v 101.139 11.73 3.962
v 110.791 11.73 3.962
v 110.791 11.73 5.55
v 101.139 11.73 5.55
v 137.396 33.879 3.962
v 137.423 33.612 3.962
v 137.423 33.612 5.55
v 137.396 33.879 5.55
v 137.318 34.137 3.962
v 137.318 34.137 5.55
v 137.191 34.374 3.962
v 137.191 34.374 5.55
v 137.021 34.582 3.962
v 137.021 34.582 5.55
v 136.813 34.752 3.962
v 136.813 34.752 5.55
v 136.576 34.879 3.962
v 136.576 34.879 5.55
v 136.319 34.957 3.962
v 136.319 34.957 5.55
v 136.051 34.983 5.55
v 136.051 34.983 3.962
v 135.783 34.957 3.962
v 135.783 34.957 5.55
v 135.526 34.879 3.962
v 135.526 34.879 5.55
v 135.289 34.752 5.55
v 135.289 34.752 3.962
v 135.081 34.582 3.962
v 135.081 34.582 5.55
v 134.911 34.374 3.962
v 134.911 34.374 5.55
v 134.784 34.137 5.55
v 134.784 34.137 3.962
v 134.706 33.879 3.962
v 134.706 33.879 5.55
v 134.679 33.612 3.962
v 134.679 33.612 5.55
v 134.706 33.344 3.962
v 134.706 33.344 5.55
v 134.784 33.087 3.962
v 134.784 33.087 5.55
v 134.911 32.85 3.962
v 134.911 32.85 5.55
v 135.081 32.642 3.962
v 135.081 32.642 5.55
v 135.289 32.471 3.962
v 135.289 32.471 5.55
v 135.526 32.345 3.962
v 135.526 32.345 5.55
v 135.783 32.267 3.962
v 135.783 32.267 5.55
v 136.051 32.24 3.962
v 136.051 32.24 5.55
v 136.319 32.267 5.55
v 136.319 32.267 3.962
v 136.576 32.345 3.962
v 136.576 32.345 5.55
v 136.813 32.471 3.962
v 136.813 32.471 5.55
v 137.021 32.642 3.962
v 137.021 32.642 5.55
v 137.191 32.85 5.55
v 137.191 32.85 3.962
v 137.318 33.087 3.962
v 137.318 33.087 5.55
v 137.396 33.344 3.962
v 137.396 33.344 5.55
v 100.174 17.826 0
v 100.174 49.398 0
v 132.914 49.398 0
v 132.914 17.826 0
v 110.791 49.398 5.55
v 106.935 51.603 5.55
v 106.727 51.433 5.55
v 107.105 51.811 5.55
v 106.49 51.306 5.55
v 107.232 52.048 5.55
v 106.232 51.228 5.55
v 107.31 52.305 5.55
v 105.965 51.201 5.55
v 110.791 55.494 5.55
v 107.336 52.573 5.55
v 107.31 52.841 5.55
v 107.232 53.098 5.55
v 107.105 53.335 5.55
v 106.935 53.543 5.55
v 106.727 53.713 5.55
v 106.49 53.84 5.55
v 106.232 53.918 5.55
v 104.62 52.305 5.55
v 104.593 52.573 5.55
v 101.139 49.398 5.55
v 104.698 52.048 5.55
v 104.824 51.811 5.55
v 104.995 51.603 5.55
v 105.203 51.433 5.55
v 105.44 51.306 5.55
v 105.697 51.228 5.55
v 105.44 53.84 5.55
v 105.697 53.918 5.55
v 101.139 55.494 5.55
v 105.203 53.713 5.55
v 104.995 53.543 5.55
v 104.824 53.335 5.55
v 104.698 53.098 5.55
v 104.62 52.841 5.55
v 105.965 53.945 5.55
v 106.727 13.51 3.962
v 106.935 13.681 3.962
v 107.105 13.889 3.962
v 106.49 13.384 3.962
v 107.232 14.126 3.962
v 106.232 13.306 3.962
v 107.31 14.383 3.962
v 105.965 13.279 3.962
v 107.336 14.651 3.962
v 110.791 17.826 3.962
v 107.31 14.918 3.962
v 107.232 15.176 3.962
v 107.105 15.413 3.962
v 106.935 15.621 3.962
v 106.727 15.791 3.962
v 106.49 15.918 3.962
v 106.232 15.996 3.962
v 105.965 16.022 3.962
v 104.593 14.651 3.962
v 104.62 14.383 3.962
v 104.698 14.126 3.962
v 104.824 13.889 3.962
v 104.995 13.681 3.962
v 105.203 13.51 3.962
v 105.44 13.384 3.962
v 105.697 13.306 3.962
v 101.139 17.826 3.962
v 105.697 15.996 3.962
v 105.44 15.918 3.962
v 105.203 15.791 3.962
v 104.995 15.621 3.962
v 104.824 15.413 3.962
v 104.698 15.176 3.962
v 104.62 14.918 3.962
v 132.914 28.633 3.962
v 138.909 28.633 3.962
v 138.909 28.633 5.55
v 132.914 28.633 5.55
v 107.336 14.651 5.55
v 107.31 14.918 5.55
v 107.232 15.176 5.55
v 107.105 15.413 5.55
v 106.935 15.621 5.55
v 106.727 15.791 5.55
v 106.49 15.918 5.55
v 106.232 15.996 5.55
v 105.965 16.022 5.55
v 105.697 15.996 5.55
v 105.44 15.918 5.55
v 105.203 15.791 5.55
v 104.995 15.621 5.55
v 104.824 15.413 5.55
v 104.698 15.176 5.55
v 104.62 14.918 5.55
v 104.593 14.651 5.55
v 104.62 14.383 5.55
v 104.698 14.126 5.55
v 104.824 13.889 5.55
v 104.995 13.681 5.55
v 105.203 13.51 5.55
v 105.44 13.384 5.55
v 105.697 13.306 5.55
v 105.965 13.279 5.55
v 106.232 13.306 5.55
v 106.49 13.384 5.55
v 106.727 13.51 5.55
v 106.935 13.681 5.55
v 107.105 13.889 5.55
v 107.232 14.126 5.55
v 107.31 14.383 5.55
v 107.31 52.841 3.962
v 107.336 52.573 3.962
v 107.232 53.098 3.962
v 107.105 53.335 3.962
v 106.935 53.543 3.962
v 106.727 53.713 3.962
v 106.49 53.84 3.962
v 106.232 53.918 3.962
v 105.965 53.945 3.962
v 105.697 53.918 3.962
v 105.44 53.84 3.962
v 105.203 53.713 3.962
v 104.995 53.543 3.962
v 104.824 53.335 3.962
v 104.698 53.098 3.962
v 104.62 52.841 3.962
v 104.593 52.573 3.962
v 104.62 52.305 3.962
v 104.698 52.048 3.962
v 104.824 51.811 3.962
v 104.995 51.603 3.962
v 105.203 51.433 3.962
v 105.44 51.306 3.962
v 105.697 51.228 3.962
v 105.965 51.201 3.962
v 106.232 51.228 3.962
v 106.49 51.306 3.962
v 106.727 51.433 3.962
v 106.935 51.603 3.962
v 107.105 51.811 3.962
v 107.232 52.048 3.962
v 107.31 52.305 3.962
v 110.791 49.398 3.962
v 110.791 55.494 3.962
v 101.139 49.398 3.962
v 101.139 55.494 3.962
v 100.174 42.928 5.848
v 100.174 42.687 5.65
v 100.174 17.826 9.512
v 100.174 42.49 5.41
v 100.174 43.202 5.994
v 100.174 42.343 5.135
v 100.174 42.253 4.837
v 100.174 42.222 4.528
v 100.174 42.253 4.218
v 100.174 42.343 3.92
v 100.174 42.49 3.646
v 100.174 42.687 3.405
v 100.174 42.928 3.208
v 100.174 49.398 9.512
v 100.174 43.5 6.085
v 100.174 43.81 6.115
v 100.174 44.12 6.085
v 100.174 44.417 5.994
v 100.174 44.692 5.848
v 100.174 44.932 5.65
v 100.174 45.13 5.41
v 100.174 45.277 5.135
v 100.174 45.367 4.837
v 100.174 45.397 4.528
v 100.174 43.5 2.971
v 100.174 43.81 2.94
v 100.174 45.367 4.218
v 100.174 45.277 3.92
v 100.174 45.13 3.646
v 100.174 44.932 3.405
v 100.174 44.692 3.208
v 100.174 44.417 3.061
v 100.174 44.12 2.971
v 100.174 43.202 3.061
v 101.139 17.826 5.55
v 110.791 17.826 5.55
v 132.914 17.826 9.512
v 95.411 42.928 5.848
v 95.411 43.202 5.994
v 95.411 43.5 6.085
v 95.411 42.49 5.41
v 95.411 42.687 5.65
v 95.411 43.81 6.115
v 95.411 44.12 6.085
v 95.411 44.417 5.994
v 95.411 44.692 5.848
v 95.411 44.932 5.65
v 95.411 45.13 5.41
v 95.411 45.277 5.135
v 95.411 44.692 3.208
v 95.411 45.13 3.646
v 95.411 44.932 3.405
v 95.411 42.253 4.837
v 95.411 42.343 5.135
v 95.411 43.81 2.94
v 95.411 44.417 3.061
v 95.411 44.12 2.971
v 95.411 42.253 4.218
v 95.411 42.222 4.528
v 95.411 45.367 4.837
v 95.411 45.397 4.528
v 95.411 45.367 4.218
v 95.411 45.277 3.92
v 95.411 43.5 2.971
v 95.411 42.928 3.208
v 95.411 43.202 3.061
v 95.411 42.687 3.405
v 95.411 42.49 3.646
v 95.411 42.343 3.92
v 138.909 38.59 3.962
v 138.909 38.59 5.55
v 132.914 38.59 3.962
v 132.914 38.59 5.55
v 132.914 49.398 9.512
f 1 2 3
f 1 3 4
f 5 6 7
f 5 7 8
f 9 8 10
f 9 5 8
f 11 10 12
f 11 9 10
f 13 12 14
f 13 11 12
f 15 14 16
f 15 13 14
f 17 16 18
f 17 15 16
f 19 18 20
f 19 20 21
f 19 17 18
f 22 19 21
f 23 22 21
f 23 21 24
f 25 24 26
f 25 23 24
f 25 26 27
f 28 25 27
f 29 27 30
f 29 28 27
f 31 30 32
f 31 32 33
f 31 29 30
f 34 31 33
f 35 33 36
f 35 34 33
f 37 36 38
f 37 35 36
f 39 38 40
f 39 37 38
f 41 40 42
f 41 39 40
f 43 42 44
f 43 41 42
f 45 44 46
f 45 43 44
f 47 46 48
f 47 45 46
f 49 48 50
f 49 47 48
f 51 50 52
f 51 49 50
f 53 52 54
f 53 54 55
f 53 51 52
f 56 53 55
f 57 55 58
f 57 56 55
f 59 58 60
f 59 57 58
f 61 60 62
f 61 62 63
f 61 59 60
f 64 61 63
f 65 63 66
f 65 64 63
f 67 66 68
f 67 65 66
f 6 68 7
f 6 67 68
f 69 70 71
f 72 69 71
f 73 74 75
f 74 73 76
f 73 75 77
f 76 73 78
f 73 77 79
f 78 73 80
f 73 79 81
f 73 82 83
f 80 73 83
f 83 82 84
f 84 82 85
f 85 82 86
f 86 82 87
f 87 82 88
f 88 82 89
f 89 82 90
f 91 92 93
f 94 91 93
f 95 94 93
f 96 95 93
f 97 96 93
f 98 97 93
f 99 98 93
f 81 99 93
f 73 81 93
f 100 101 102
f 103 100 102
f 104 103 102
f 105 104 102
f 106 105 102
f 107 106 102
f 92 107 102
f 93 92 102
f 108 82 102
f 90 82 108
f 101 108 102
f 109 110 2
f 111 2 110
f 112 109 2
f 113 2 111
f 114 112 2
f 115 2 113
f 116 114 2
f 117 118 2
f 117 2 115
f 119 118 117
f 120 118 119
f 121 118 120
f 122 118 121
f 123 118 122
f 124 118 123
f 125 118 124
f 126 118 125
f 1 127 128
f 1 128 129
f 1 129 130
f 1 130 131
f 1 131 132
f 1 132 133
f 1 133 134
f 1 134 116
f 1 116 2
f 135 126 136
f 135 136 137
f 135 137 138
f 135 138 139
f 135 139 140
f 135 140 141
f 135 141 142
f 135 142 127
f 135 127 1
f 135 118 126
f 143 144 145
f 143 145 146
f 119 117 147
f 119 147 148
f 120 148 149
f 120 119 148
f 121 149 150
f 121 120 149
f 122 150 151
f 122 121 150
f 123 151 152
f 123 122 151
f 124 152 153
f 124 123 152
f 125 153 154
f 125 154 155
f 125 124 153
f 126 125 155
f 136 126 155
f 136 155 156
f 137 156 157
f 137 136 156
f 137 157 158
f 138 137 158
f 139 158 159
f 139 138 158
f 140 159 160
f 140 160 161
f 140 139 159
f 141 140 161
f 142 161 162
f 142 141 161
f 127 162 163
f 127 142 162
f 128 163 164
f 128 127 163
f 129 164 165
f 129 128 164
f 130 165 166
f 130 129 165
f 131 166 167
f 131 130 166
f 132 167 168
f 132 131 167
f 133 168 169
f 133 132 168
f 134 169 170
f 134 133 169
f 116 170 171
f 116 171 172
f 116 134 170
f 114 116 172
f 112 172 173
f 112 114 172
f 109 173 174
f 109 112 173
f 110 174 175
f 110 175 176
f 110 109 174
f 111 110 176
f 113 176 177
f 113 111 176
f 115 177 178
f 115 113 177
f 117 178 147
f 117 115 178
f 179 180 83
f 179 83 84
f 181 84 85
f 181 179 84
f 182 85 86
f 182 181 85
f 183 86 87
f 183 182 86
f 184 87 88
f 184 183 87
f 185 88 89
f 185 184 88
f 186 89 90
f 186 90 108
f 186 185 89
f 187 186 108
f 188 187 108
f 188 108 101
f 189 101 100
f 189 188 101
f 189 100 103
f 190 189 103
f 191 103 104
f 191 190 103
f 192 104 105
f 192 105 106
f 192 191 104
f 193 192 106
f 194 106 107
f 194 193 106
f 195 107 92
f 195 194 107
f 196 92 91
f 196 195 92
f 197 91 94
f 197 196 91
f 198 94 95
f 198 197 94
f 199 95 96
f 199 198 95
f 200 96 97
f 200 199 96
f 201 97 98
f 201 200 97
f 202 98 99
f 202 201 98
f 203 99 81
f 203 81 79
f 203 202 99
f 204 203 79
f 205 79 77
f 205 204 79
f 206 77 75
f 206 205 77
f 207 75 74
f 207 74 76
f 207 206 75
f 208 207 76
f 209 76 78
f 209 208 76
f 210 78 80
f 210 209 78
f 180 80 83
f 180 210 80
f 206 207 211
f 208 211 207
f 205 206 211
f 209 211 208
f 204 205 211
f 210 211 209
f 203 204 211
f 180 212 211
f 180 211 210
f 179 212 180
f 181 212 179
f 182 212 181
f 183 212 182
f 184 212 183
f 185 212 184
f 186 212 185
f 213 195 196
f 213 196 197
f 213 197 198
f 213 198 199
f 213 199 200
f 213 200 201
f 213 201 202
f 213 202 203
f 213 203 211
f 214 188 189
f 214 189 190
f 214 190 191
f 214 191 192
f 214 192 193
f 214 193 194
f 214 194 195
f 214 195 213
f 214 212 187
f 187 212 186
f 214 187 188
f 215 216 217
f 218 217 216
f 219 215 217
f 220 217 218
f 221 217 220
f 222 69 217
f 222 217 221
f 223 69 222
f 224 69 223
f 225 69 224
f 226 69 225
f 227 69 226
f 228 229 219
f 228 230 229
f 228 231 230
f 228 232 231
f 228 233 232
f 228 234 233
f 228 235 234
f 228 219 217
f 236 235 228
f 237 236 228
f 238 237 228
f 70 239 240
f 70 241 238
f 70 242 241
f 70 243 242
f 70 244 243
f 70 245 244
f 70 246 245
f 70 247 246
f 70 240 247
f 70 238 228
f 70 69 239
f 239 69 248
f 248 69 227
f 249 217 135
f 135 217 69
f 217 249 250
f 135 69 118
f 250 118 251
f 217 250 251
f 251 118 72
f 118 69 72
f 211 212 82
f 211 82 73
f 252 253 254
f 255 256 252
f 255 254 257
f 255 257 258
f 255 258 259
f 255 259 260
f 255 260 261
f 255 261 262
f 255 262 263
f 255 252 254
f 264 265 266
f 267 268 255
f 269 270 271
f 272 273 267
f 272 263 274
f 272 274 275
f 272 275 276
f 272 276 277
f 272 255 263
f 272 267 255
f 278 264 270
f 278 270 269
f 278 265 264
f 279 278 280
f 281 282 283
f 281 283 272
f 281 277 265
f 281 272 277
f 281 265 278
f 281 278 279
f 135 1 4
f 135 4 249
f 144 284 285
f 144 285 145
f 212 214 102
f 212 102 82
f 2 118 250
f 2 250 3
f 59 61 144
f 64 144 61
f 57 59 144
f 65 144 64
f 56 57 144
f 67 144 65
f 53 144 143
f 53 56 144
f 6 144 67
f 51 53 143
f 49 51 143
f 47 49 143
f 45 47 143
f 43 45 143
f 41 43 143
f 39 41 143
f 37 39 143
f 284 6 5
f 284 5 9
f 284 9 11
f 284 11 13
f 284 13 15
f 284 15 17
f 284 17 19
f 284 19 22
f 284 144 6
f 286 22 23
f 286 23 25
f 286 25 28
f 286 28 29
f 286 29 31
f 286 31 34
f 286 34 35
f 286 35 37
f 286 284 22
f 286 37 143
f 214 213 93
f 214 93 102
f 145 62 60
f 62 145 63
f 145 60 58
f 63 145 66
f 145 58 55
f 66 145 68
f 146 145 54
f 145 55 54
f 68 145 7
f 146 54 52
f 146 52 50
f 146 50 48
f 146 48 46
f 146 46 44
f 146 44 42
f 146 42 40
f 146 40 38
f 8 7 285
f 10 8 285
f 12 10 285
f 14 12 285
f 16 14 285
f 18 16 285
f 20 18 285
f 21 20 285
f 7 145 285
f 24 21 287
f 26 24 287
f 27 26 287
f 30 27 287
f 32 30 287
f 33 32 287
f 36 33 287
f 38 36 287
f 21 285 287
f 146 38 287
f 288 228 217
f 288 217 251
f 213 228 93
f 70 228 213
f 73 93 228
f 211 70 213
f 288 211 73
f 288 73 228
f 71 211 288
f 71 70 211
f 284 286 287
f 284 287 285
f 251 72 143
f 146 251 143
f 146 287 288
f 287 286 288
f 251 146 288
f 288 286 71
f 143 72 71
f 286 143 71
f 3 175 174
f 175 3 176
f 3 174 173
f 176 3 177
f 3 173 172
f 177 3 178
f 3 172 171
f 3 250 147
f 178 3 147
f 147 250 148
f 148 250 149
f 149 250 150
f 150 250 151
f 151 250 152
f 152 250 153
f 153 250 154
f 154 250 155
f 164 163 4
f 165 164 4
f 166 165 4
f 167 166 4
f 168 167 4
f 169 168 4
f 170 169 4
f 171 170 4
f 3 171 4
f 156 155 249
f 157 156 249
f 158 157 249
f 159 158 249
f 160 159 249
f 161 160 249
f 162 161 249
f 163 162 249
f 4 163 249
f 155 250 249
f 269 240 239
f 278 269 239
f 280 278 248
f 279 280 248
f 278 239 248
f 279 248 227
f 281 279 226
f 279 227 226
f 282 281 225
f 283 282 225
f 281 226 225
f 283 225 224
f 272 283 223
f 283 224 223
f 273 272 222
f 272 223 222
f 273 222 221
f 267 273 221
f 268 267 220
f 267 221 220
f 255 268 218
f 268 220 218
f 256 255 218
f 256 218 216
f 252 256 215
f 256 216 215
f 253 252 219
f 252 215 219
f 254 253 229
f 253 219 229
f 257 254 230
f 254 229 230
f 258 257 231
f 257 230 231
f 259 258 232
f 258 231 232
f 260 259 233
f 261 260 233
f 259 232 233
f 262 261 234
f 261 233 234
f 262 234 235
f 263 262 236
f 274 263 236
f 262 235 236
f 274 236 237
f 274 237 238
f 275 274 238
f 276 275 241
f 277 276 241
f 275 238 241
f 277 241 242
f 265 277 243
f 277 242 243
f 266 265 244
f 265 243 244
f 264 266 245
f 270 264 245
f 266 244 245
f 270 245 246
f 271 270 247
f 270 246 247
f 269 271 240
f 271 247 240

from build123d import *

# Parameters (mm, degrees)
SKETCH1_W           = 32.7406
SKETCH1_H           = 31.5722
BOSS_EXTRUDE1_DEPTH = 3.9624
SKETCH2_R           = 1.3716
BOSS_EXTRUDE2_DEPTH = 1.5875
SKETCH3_W           = 32.7406
SKETCH3_H           = 31.5722
BOSS_EXTRUDE3_DEPTH = 3.9624
SKETCH4_R           = 1.5875
BOSS_EXTRUDE4_DEPTH = 4.7625


with BuildPart() as part:
    # Sketch1 → Boss-Extrude1 (new body)
    with BuildSketch(Plane.XY):
        with Locations((116.543894781, 33.611845874)):
            Rectangle(SKETCH1_W, SKETCH1_H)
    extrude(amount=BOSS_EXTRUDE1_DEPTH)

    # Sketch2 → Boss-Extrude2 (add)
    with BuildSketch(Plane.XY.offset(3.9624)):
        Polygon((100.173594781, 49.397945874), (101.138794781, 49.397945874), (101.138794781, 55.493945874), (110.790794781, 55.493945874), (110.790794781, 49.397945874), (132.914194781, 49.397945874), (132.914194781, 38.590245874), (138.908594781, 38.590245874), (138.908594781, 28.633445874), (132.914194781, 28.633445874), (132.914194781, 17.825745874), (110.790794781, 17.825745874), (110.790794781, 11.729745874), (101.138794781, 11.729745874), (101.138794781, 17.825745874), (100.173594781, 17.825745874), align=None)
        with Locations((136.050967198, 33.611845874)):
            Circle(SKETCH2_R, mode=Mode.SUBTRACT)
        with Locations((105.964794781, 52.572945874)):
            Circle(SKETCH2_R, mode=Mode.SUBTRACT)
        with Locations((105.964794781, 14.650745874)):
            Circle(SKETCH2_R, mode=Mode.SUBTRACT)
    extrude(amount=BOSS_EXTRUDE2_DEPTH)

    # Sketch3 → Boss-Extrude3 (add)
    with BuildSketch(Plane.XY.offset(5.5499)):
        with Locations((116.543894781, 33.611845874)):
            Rectangle(SKETCH3_W, SKETCH3_H)
    extrude(amount=BOSS_EXTRUDE3_DEPTH)

    # Sketch4 → Boss-Extrude4 (add)
    with BuildSketch(Plane.ZY.offset(-100.173594781)):
        with Locations(Location((4.52755, 43.809945874, 0), (0, 0, 180))):
            Circle(SKETCH4_R)
    extrude(amount=BOSS_EXTRUDE4_DEPTH)


solid = part.part
